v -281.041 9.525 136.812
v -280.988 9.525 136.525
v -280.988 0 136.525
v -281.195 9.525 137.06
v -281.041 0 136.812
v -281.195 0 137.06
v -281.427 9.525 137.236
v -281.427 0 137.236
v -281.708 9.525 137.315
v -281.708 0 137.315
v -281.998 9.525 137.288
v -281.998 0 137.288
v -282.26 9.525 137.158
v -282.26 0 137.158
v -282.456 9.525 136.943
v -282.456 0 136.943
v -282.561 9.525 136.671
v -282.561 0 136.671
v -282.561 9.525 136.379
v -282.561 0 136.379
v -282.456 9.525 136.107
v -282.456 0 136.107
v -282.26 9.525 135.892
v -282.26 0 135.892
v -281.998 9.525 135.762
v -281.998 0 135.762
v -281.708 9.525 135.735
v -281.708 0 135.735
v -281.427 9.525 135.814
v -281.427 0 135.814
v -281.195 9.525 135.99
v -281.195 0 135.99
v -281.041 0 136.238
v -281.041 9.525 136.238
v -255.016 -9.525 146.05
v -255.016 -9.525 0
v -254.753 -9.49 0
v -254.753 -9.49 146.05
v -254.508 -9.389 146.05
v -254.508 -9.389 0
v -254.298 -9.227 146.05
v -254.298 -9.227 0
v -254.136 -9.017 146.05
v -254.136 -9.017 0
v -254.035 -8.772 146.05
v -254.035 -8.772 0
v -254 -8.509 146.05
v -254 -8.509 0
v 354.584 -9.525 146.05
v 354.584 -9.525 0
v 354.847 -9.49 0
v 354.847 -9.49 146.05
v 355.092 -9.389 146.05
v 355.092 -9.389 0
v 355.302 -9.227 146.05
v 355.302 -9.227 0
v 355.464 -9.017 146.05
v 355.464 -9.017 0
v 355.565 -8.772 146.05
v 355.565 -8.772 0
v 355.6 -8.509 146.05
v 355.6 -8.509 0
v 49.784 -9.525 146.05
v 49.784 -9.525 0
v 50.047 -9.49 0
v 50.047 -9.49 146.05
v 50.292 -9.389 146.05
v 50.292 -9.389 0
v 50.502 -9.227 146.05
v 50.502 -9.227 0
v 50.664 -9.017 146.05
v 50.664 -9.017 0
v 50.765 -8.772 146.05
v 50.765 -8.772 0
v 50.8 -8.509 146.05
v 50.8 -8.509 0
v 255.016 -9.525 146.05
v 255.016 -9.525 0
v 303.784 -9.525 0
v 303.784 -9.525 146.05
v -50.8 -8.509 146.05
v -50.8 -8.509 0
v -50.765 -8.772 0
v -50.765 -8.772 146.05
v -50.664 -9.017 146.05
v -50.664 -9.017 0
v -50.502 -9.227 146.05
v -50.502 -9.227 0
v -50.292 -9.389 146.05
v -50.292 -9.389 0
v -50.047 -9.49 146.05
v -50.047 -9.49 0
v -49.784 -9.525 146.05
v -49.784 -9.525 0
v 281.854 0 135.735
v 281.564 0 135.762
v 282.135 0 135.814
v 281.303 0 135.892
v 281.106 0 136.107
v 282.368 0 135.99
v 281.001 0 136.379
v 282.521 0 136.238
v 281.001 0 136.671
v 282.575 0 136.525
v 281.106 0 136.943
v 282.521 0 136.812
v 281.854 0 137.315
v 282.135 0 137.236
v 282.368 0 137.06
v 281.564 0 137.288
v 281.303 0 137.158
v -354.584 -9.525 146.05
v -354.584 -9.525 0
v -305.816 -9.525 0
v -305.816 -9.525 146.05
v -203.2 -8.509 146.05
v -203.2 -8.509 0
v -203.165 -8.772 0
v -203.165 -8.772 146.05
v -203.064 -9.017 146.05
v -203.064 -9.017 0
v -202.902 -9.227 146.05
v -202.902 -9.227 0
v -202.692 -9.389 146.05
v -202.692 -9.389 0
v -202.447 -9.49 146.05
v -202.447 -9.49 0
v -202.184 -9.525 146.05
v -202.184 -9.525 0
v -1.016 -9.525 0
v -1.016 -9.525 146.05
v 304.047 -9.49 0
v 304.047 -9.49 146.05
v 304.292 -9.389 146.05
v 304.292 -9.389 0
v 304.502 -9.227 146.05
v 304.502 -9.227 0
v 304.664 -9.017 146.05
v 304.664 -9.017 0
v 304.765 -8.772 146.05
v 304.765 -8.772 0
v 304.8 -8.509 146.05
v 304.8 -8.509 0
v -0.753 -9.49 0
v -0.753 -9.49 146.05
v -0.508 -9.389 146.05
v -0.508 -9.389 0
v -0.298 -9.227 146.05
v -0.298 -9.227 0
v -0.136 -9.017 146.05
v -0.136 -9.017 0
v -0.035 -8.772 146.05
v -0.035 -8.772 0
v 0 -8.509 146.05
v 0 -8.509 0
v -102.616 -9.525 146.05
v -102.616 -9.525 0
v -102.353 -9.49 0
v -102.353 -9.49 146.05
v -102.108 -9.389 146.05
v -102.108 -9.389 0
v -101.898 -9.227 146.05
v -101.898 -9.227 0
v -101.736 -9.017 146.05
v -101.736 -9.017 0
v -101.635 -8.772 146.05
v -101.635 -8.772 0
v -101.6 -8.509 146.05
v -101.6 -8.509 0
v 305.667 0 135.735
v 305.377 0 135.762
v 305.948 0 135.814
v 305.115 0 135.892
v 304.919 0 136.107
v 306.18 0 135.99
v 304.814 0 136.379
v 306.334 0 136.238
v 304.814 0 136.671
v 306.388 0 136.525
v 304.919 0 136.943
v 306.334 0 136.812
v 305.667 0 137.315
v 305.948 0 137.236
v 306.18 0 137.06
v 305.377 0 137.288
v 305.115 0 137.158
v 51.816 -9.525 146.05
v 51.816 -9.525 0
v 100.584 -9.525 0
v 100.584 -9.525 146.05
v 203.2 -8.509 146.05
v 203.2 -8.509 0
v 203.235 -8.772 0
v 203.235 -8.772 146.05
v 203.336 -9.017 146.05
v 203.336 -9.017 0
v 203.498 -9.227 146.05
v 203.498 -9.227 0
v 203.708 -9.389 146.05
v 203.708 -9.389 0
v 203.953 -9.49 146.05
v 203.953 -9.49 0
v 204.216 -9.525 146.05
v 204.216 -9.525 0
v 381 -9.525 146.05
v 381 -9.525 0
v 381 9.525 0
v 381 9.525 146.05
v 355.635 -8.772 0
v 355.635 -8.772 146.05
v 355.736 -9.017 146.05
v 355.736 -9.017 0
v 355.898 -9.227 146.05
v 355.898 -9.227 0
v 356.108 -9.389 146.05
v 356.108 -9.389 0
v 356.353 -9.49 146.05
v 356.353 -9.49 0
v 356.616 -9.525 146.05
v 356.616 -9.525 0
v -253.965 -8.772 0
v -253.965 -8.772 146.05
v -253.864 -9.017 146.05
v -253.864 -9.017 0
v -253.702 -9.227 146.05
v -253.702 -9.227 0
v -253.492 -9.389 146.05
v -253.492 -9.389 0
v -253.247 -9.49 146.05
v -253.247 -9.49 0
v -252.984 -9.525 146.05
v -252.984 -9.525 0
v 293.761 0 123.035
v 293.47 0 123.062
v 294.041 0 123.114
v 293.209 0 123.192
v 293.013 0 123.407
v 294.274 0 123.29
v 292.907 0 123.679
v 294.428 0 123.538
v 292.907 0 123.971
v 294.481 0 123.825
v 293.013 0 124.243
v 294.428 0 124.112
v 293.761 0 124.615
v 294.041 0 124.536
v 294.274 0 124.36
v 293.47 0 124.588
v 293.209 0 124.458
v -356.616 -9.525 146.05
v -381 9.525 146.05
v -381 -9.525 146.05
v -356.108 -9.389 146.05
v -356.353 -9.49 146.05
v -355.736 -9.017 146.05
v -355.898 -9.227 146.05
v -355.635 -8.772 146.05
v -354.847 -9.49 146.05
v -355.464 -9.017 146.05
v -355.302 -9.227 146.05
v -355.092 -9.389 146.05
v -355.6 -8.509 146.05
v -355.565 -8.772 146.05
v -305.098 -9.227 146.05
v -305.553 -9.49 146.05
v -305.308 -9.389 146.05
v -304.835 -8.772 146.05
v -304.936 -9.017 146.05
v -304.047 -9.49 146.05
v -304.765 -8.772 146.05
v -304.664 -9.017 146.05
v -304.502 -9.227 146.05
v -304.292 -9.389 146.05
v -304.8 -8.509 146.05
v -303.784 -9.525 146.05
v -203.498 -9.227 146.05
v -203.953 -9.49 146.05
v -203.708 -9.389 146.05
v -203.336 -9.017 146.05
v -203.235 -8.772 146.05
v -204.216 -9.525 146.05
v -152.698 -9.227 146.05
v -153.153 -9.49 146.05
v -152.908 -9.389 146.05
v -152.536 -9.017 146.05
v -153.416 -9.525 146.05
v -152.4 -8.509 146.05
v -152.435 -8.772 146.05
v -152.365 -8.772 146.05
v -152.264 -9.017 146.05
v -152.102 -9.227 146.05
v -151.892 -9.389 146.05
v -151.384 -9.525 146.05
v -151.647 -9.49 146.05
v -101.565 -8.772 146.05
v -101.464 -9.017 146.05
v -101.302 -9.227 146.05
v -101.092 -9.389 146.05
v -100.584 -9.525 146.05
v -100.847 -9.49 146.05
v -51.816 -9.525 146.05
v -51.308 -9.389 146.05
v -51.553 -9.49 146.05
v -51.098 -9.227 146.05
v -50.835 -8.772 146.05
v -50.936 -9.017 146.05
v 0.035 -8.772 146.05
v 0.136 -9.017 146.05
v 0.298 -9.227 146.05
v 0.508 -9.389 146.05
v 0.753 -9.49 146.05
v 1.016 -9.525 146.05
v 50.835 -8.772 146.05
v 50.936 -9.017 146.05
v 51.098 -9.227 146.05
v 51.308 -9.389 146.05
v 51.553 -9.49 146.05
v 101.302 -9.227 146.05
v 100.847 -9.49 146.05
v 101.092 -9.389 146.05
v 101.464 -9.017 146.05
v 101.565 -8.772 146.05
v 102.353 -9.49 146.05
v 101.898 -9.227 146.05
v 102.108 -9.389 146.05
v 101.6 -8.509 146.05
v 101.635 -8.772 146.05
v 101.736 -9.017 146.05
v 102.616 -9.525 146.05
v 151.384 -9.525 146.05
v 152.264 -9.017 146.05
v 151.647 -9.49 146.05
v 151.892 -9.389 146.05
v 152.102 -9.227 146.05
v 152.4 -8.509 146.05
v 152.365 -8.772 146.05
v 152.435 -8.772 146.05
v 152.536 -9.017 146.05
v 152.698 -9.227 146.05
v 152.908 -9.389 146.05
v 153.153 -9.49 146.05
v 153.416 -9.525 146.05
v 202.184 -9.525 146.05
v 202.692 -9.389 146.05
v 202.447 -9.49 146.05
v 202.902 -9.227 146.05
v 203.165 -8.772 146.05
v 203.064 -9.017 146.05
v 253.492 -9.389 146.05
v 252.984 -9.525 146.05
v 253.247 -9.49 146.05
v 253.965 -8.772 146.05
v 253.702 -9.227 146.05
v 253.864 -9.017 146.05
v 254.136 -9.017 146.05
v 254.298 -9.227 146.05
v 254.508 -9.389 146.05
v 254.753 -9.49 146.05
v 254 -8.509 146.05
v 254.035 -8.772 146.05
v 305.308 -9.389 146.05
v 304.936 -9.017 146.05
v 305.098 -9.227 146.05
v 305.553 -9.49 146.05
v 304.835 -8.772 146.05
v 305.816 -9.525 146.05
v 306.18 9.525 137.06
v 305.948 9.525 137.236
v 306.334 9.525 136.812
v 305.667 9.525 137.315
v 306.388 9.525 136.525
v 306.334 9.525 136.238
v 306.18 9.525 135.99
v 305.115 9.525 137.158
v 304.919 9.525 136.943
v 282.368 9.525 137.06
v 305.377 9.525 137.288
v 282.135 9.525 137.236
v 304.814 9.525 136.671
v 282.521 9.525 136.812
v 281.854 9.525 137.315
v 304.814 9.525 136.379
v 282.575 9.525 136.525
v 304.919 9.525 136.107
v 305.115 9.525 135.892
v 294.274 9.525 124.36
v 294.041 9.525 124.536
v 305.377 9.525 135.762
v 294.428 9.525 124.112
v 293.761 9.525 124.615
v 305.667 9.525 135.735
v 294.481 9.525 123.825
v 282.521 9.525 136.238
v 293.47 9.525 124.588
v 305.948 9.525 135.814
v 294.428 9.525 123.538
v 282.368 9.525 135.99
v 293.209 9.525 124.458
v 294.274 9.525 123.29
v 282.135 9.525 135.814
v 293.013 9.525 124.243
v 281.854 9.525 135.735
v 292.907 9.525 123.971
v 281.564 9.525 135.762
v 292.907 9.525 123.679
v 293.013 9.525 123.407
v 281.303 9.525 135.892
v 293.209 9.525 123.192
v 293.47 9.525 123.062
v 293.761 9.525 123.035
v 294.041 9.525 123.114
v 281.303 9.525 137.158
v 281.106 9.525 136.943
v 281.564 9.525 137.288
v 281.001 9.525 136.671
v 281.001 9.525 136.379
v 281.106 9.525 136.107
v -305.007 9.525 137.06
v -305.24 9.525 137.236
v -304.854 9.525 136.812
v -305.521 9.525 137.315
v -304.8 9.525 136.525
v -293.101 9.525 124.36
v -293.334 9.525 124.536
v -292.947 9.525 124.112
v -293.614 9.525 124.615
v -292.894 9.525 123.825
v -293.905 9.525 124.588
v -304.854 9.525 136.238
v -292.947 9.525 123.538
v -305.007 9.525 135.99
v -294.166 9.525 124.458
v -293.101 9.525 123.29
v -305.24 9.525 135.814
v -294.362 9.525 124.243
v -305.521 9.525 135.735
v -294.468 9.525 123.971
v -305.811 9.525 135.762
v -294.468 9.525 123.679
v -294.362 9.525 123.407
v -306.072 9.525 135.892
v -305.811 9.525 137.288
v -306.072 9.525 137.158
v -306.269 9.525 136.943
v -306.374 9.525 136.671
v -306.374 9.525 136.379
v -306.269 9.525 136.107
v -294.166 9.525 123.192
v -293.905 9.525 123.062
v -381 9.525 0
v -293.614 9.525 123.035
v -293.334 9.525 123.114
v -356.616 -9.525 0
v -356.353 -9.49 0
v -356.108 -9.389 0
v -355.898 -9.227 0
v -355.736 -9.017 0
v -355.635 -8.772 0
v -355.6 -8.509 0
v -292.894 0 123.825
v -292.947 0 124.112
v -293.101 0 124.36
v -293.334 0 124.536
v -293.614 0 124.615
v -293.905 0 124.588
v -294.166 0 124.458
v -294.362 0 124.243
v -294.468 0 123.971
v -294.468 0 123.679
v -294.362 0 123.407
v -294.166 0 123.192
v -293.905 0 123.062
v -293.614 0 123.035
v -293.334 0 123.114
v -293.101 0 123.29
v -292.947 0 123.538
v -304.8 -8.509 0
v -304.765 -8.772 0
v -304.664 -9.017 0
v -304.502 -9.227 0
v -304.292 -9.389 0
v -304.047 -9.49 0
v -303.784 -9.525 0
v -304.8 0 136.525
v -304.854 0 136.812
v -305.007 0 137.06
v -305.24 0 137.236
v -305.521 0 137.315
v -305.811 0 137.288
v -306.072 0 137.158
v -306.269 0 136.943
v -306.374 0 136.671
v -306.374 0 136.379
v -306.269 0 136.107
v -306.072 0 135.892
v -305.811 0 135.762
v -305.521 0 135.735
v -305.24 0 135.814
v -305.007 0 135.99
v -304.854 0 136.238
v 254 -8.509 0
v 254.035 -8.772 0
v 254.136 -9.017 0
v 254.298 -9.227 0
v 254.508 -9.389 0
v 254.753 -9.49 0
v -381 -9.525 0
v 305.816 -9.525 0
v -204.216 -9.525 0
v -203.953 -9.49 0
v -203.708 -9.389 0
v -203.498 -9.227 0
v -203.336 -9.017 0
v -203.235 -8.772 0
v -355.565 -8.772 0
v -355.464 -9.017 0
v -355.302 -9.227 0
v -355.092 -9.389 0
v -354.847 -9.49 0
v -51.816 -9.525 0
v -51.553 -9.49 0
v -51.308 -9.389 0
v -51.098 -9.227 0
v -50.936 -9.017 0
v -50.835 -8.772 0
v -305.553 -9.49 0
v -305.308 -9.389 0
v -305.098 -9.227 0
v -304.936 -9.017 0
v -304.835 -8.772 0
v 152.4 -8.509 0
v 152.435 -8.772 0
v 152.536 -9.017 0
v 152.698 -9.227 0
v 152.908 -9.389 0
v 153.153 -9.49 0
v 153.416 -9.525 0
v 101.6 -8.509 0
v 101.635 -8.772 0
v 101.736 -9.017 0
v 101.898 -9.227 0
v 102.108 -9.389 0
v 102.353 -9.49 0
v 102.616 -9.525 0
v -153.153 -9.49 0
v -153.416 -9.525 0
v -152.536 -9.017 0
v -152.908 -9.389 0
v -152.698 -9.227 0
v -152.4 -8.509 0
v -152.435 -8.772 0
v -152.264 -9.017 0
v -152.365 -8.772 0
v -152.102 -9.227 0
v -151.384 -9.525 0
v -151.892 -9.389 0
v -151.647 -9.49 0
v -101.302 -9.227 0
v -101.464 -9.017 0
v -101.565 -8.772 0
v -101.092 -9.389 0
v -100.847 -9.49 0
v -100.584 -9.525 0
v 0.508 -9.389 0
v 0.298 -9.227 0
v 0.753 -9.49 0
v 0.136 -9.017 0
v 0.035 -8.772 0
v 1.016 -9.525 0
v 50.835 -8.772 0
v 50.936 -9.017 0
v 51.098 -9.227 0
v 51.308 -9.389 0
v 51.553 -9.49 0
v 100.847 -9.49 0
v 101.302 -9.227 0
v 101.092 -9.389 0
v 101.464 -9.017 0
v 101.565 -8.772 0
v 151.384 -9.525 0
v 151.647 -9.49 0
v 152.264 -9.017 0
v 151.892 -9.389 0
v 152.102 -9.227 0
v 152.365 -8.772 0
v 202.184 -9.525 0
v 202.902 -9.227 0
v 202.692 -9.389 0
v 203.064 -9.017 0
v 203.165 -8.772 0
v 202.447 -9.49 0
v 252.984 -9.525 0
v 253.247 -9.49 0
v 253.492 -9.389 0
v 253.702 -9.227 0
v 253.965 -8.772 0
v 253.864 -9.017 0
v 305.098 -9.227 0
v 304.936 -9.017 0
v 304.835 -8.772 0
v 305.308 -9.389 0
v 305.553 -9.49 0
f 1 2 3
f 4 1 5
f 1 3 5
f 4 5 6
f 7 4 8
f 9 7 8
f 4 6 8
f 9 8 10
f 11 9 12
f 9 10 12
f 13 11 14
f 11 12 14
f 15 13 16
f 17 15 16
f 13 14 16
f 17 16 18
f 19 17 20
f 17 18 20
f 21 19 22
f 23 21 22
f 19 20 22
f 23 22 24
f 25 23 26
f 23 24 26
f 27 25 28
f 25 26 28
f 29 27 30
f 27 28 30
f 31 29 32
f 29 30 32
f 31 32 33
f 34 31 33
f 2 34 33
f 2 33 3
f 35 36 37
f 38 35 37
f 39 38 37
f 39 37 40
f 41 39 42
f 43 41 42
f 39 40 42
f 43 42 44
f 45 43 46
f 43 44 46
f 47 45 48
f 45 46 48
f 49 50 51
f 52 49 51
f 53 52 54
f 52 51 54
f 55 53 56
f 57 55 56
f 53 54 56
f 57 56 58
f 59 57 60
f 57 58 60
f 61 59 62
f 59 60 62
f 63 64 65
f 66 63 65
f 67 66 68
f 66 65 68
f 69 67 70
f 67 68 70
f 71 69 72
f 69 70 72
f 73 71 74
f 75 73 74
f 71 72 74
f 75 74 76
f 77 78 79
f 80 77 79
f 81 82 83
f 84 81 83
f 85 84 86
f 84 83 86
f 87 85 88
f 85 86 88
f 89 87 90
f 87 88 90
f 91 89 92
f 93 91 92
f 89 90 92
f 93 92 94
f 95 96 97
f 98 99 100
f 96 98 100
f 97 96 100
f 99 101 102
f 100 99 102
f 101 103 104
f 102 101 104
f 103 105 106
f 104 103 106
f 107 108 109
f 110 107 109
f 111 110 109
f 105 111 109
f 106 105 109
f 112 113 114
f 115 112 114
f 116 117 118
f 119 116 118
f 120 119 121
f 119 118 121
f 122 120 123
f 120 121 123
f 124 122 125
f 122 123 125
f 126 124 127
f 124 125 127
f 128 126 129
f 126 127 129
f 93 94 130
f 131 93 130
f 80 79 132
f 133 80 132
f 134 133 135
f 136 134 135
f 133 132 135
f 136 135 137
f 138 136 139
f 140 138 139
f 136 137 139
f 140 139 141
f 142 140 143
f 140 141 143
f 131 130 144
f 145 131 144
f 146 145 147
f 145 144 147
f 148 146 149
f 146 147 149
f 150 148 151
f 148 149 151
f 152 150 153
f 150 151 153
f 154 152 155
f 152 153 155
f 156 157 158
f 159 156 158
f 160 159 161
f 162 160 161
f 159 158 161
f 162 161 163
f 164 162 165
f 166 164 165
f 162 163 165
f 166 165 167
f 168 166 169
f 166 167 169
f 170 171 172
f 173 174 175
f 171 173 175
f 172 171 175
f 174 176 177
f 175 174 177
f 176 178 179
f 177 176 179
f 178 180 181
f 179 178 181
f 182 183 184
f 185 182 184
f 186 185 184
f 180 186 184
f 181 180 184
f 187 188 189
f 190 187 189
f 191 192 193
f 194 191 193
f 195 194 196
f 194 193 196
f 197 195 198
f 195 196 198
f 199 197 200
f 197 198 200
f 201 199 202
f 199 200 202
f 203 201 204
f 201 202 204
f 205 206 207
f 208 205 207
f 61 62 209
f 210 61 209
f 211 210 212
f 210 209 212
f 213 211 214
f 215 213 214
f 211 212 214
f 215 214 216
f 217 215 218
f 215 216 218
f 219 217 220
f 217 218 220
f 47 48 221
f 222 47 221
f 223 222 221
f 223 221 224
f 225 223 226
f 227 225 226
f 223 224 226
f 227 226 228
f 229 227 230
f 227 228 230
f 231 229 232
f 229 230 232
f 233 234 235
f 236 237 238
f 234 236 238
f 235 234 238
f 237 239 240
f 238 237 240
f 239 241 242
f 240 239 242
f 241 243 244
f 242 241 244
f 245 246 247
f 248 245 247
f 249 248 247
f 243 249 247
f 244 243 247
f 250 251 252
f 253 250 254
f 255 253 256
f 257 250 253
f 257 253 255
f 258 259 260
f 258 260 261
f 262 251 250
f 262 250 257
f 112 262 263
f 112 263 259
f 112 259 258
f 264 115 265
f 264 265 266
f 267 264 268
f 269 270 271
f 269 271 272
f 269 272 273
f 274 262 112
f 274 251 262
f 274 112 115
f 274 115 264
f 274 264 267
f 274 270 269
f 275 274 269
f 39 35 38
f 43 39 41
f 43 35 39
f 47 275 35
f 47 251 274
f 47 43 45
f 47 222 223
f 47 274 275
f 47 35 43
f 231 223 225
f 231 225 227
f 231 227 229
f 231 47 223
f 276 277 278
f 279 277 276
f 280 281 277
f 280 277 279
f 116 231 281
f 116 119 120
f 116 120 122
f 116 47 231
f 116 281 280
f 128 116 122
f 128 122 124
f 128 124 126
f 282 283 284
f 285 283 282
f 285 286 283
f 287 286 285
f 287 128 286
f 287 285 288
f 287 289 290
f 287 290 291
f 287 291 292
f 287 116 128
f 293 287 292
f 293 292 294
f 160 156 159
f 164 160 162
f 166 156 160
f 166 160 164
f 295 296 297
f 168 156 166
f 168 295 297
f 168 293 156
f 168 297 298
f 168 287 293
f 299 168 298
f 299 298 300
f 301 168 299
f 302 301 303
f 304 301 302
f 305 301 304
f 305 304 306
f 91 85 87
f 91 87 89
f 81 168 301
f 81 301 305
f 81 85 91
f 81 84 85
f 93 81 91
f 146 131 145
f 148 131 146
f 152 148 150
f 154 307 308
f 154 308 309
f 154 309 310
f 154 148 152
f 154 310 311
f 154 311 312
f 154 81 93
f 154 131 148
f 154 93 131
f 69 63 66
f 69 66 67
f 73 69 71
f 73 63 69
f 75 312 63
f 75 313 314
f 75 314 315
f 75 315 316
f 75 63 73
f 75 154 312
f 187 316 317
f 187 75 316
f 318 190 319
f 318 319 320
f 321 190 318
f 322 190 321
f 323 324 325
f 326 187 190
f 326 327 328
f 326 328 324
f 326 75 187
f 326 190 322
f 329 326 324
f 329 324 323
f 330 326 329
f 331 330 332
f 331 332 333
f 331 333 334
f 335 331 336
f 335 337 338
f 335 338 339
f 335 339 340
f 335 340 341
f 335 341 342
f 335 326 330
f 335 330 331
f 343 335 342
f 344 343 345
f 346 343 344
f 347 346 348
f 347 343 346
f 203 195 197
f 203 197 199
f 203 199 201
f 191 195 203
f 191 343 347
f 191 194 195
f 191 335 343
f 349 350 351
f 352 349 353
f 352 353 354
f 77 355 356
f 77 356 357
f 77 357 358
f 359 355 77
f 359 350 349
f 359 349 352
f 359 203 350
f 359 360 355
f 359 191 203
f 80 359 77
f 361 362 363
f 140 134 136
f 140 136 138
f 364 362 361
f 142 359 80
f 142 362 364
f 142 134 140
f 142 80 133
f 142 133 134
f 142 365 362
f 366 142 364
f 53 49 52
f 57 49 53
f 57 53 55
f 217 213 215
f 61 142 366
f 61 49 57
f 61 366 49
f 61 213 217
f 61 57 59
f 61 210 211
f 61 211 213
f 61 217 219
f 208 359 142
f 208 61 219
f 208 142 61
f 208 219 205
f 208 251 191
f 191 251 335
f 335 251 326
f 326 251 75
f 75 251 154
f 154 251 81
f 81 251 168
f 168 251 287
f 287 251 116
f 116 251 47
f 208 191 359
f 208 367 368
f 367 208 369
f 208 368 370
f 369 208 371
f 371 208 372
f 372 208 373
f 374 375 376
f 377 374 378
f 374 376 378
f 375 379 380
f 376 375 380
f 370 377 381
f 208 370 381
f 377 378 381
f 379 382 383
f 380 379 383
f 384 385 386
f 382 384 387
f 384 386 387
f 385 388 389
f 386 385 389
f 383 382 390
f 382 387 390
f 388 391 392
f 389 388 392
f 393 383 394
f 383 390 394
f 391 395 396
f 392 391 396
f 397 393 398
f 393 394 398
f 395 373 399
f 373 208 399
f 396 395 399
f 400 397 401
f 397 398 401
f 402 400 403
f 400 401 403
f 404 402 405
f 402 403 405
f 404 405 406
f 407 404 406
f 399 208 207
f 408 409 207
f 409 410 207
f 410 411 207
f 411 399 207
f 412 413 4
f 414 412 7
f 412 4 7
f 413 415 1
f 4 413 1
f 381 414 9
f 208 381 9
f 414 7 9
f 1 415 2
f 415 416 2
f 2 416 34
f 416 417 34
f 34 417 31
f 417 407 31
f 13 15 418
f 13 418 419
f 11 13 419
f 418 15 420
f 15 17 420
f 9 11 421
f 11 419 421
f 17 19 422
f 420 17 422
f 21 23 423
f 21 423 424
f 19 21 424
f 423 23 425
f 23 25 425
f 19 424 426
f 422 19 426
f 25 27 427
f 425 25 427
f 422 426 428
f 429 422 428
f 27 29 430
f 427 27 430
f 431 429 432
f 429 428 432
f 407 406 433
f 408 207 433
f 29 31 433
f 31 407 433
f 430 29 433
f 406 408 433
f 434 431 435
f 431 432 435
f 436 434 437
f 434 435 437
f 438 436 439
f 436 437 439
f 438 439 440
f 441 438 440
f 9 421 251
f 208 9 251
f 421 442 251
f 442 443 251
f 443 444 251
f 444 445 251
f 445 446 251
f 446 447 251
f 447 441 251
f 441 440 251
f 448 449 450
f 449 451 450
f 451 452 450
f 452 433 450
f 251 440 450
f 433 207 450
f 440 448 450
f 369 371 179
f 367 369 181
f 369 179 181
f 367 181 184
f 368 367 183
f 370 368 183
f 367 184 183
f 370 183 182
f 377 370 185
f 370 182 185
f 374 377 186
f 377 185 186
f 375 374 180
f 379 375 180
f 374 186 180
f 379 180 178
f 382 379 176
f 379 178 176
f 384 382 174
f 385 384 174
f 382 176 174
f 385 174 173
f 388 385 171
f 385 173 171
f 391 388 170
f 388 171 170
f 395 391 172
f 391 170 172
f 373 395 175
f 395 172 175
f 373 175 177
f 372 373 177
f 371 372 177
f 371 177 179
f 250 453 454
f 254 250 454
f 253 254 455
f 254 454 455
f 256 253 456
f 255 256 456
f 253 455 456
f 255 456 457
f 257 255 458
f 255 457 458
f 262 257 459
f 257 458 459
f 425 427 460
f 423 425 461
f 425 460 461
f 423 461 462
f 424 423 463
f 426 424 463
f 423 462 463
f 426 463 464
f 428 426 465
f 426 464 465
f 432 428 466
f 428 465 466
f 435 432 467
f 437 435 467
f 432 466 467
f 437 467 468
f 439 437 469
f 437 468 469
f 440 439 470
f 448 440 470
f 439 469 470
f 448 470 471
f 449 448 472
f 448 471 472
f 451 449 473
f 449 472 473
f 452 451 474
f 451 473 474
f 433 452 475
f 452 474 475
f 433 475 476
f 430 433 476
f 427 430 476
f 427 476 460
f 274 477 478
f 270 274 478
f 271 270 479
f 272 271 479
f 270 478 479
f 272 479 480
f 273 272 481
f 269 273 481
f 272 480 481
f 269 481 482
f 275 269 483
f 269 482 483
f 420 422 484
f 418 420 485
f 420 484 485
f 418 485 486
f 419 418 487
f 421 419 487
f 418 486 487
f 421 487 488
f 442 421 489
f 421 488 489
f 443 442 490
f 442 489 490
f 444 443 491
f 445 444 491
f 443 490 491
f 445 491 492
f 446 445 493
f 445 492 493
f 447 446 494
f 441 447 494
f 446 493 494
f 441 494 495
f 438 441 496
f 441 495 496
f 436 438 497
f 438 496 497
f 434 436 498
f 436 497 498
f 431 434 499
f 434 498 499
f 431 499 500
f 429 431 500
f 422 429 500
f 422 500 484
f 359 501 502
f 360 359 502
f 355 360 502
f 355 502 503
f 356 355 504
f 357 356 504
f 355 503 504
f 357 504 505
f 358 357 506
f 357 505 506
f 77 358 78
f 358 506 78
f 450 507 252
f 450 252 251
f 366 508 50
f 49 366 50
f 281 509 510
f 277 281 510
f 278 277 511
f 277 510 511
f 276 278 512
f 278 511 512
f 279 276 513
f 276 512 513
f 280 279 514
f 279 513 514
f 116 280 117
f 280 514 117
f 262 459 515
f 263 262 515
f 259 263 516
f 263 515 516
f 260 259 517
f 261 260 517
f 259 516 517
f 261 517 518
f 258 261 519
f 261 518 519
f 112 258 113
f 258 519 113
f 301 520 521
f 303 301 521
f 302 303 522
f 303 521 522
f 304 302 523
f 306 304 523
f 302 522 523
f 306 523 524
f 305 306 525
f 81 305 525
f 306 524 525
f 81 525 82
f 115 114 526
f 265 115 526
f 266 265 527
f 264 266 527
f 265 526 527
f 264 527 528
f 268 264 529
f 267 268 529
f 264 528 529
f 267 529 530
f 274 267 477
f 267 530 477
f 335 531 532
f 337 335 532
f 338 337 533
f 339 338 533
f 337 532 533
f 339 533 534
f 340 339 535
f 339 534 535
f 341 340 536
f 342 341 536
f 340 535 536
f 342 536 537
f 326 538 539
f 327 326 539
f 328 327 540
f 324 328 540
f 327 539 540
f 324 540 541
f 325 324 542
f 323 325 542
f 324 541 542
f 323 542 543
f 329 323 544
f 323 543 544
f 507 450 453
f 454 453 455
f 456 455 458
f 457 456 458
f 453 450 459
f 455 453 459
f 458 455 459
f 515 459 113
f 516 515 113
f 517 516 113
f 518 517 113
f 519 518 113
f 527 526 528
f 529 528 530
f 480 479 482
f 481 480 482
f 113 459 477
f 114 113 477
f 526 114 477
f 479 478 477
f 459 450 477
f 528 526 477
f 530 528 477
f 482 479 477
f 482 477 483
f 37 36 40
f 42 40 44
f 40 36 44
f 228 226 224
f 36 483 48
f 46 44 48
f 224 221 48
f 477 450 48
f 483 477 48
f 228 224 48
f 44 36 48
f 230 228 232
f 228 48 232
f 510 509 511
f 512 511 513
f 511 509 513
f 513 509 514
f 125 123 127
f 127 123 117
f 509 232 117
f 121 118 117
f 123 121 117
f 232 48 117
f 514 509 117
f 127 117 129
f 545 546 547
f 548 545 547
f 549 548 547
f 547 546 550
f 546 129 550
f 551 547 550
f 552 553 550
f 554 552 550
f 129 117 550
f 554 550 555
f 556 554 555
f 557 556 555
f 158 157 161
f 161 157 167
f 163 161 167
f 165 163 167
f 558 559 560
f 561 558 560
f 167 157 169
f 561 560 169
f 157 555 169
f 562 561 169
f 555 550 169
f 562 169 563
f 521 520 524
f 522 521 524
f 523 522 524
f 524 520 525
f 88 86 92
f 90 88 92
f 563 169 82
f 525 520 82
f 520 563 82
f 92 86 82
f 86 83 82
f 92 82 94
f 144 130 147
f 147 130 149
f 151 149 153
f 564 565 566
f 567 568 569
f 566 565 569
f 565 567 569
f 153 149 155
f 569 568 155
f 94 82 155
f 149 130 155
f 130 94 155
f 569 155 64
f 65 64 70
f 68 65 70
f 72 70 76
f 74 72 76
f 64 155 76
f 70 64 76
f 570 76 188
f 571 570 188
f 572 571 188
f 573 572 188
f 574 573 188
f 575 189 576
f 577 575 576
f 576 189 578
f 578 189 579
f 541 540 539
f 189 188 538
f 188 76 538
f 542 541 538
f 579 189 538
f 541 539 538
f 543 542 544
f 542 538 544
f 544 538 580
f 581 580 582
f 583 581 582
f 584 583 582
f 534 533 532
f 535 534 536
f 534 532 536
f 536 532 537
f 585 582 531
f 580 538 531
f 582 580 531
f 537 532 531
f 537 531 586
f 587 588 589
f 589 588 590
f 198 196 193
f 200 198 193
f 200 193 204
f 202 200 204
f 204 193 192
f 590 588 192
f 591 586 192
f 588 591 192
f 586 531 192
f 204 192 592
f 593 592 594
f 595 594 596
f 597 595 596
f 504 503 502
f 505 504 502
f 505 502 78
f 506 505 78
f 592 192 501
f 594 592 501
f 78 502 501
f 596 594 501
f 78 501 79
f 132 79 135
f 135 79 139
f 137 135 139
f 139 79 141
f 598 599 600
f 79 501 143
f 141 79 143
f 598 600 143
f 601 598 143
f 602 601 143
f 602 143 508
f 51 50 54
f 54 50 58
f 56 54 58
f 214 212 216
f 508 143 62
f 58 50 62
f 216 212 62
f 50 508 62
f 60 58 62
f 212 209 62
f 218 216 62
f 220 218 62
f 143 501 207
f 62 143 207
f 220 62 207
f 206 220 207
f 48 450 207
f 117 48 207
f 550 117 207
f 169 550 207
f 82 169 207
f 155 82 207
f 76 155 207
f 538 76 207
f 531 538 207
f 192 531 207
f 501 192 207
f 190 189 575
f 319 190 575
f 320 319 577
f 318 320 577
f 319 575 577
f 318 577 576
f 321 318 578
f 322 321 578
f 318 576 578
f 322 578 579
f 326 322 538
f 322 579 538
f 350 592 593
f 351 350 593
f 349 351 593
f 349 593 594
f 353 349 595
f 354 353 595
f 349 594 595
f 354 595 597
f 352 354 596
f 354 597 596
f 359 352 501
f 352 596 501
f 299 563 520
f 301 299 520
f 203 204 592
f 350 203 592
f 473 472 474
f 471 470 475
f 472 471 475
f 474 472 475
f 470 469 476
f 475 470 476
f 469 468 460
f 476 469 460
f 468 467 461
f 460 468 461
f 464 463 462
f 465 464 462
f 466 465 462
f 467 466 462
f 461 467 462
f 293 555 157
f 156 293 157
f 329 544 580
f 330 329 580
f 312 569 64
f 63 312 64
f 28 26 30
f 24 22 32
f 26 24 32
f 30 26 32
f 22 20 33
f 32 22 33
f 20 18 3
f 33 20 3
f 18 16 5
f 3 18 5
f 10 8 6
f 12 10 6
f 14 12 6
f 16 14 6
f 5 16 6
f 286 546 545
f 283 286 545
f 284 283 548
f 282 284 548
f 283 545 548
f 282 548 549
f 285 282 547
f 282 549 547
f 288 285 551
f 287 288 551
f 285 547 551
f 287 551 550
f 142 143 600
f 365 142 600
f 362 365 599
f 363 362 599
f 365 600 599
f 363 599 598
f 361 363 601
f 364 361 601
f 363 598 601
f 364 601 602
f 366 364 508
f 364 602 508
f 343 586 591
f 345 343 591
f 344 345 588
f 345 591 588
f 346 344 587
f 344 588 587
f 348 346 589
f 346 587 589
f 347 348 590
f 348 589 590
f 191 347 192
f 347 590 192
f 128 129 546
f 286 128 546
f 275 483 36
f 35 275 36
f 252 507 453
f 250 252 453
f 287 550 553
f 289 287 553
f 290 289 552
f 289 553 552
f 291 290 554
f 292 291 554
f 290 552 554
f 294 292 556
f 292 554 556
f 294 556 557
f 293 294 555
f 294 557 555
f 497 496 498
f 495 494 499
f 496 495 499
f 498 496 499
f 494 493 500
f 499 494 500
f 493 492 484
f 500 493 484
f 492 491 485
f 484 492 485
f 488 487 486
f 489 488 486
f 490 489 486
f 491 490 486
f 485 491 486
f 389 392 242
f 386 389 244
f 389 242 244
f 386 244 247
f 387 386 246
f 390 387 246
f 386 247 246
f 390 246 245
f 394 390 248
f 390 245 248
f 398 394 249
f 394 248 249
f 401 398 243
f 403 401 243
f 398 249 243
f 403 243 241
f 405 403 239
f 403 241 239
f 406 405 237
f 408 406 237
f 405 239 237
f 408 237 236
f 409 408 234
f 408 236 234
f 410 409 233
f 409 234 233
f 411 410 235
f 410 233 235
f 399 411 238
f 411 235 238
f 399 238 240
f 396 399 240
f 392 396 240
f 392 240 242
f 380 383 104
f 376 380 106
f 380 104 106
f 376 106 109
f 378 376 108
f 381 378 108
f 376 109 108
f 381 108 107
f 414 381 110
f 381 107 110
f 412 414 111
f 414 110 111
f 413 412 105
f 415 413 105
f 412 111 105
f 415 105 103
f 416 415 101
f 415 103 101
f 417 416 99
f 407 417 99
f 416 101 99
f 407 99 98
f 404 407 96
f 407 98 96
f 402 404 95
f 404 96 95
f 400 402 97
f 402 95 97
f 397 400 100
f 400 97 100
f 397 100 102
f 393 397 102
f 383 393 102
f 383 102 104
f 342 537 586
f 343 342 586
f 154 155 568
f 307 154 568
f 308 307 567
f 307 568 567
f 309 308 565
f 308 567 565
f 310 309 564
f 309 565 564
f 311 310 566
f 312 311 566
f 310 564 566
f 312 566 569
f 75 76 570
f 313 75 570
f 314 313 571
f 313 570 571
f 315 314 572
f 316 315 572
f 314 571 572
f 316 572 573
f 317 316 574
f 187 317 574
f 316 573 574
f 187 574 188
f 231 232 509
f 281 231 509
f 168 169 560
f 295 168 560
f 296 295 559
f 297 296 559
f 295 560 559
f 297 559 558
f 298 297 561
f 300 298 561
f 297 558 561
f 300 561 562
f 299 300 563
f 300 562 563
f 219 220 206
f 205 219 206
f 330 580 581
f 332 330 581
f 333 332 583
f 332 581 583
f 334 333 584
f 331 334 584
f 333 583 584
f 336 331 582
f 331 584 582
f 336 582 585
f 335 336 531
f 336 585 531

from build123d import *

# Parameters (mm, degrees)
F1_DEPTH = 146.05
F2_W     = 343.069662
F2_H     = 137.227848
F2_W_2   = 304.364362
F2_H_2   = 195.285798
F3_DEPTH = 1143
F4_R     = 0.79375
F5_DEPTH = 25.4


with BuildPart() as f1:
    # F0 (on Top) → F1 (new body)
    with BuildSketch(Plane.XY):
        with BuildLine():
            Line((458.216, -9.525), (508, -9.525))
            Line((508, -9.525), (508, 9.525))
            Line((508, 9.525), (-508, 9.525))
            Line((-508, 9.525), (-508, -8.509))
            ThreePointArc((-508, -8.509), (-507.70242, -9.22742), (-506.984, -9.525))
            Line((-506.984, -9.525), (-458.216, -9.525))
            ThreePointArc((-458.216, -9.525), (-457.49758, -9.22742), (-457.2, -8.509))
            ThreePointArc((-457.2, -8.509), (-456.90242, -9.22742), (-456.184, -9.525))
            Line((-456.184, -9.525), (-407.416, -9.525))
            ThreePointArc((-407.416, -9.525), (-406.69758, -9.22742), (-406.4, -8.509))
            ThreePointArc((-406.4, -8.509), (-406.10242, -9.22742), (-405.384, -9.525))
            Line((-405.384, -9.525), (-356.616, -9.525))
            ThreePointArc((-356.616, -9.525), (-355.89758, -9.22742), (-355.6, -8.509))
            ThreePointArc((-355.6, -8.509), (-355.30242, -9.22742), (-354.584, -9.525))
            Line((-354.584, -9.525), (-305.816, -9.525))
            ThreePointArc((-305.816, -9.525), (-305.09758, -9.22742), (-304.8, -8.509))
            ThreePointArc((-304.8, -8.509), (-304.50242, -9.22742), (-303.784, -9.525))
            Line((-303.784, -9.525), (-255.016, -9.525))
            ThreePointArc((-255.016, -9.525), (-254.29758, -9.22742), (-254, -8.509))
            ThreePointArc((-254, -8.509), (-253.70242, -9.22742), (-252.984, -9.525))
            Line((-252.984, -9.525), (-204.216, -9.525))
            ThreePointArc((-204.216, -9.525), (-203.49758, -9.22742), (-203.2, -8.509))
            ThreePointArc((-203.2, -8.509), (-202.90242, -9.22742), (-202.184, -9.525))
            Line((-202.184, -9.525), (-153.416, -9.525))
            ThreePointArc((-153.416, -9.525), (-152.69758, -9.22742), (-152.4, -8.509))
            ThreePointArc((-152.4, -8.509), (-152.10242, -9.22742), (-151.384, -9.525))
            Line((-151.384, -9.525), (-102.616, -9.525))
            ThreePointArc((-102.616, -9.525), (-101.89758, -9.22742), (-101.6, -8.509))
            ThreePointArc((-101.6, -8.509), (-101.30242, -9.22742), (-100.584, -9.525))
            Line((-100.584, -9.525), (-51.816, -9.525))
            ThreePointArc((-51.816, -9.525), (-51.09758, -9.22742), (-50.8, -8.509))
            ThreePointArc((-50.8, -8.509), (-50.50242, -9.22742), (-49.784, -9.525))
            Line((-49.784, -9.525), (-1.016, -9.525))
            ThreePointArc((-1.016, -9.525), (-0.29758, -9.22742), (0, -8.509))
            ThreePointArc((0, -8.509), (0.29758, -9.22742), (1.016, -9.525))
            Line((1.016, -9.525), (49.784, -9.525))
            ThreePointArc((49.784, -9.525), (50.50242, -9.22742), (50.8, -8.509))
            ThreePointArc((50.8, -8.509), (51.09758, -9.22742), (51.816, -9.525))
            Line((51.816, -9.525), (100.584, -9.525))
            ThreePointArc((100.584, -9.525), (101.30242, -9.22742), (101.6, -8.509))
            ThreePointArc((101.6, -8.509), (101.89758, -9.22742), (102.616, -9.525))
            Line((102.616, -9.525), (151.384, -9.525))
            ThreePointArc((151.384, -9.525), (152.10242, -9.22742), (152.4, -8.509))
            ThreePointArc((152.4, -8.509), (152.69758, -9.22742), (153.416, -9.525))
            Line((153.416, -9.525), (202.184, -9.525))
            ThreePointArc((202.184, -9.525), (202.90242, -9.22742), (203.2, -8.509))
            ThreePointArc((203.2, -8.509), (203.49758, -9.22742), (204.216, -9.525))
            Line((204.216, -9.525), (252.984, -9.525))
            ThreePointArc((252.984, -9.525), (253.70242, -9.22742), (254, -8.509))
            ThreePointArc((254, -8.509), (254.29758, -9.22742), (255.016, -9.525))
            Line((255.016, -9.525), (303.784, -9.525))
            ThreePointArc((303.784, -9.525), (304.50242, -9.22742), (304.8, -8.509))
            ThreePointArc((304.8, -8.509), (305.09758, -9.22742), (305.816, -9.525))
            Line((305.816, -9.525), (354.584, -9.525))
            ThreePointArc((354.584, -9.525), (355.30242, -9.22742), (355.6, -8.509))
            ThreePointArc((355.6, -8.509), (355.89758, -9.22742), (356.616, -9.525))
            Line((356.616, -9.525), (405.384, -9.525))
            ThreePointArc((405.384, -9.525), (406.10242, -9.22742), (406.4, -8.509))
            ThreePointArc((406.4, -8.509), (406.69758, -9.22742), (407.416, -9.525))
            Line((407.416, -9.525), (456.184, -9.525))
            ThreePointArc((456.184, -9.525), (456.90242, -9.22742), (457.2, -8.509))
            ThreePointArc((457.2, -8.509), (457.49758, -9.22742), (458.216, -9.525))
        make_face()
        with BuildLine():
            ThreePointArc((-506.984, -9.525), (-507.70242, -9.22742), (-508, -8.509))
            Line((-508, -8.509), (-508, -9.525))
            Line((-508, -9.525), (-506.984, -9.525))
        make_face()
    extrude(amount=F1_DEPTH)

    # F2 (on Top) → F3 (cut)
    with BuildSketch(Plane.XY):
        with Locations((552.534831, -20.971623)):
            Rectangle(F2_W, F2_H)
        with Locations((-533.182181, -39.444607)):
            Rectangle(F2_W_2, F2_H_2)
    extrude(amount=F3_DEPTH, mode=Mode.SUBTRACT)

    # F4 (on Front) → F5 (cut)
    with BuildSketch(Plane.XZ):
        with Locations((-293.6875, 123.825)):
            Circle(F4_R)
        with Locations((-281.78125, 136.525)):
            Circle(F4_R)
        with Locations((-305.59375, 136.525)):
            Circle(F4_R)
        with Locations((293.6875, 123.825)):
            Circle(F4_R)
        with Locations((305.59375, 136.525)):
            Circle(F4_R)
        with Locations((281.78125, 136.525)):
            Circle(F4_R)
    extrude(amount=-F5_DEPTH, mode=Mode.SUBTRACT)


solid = f1.part
